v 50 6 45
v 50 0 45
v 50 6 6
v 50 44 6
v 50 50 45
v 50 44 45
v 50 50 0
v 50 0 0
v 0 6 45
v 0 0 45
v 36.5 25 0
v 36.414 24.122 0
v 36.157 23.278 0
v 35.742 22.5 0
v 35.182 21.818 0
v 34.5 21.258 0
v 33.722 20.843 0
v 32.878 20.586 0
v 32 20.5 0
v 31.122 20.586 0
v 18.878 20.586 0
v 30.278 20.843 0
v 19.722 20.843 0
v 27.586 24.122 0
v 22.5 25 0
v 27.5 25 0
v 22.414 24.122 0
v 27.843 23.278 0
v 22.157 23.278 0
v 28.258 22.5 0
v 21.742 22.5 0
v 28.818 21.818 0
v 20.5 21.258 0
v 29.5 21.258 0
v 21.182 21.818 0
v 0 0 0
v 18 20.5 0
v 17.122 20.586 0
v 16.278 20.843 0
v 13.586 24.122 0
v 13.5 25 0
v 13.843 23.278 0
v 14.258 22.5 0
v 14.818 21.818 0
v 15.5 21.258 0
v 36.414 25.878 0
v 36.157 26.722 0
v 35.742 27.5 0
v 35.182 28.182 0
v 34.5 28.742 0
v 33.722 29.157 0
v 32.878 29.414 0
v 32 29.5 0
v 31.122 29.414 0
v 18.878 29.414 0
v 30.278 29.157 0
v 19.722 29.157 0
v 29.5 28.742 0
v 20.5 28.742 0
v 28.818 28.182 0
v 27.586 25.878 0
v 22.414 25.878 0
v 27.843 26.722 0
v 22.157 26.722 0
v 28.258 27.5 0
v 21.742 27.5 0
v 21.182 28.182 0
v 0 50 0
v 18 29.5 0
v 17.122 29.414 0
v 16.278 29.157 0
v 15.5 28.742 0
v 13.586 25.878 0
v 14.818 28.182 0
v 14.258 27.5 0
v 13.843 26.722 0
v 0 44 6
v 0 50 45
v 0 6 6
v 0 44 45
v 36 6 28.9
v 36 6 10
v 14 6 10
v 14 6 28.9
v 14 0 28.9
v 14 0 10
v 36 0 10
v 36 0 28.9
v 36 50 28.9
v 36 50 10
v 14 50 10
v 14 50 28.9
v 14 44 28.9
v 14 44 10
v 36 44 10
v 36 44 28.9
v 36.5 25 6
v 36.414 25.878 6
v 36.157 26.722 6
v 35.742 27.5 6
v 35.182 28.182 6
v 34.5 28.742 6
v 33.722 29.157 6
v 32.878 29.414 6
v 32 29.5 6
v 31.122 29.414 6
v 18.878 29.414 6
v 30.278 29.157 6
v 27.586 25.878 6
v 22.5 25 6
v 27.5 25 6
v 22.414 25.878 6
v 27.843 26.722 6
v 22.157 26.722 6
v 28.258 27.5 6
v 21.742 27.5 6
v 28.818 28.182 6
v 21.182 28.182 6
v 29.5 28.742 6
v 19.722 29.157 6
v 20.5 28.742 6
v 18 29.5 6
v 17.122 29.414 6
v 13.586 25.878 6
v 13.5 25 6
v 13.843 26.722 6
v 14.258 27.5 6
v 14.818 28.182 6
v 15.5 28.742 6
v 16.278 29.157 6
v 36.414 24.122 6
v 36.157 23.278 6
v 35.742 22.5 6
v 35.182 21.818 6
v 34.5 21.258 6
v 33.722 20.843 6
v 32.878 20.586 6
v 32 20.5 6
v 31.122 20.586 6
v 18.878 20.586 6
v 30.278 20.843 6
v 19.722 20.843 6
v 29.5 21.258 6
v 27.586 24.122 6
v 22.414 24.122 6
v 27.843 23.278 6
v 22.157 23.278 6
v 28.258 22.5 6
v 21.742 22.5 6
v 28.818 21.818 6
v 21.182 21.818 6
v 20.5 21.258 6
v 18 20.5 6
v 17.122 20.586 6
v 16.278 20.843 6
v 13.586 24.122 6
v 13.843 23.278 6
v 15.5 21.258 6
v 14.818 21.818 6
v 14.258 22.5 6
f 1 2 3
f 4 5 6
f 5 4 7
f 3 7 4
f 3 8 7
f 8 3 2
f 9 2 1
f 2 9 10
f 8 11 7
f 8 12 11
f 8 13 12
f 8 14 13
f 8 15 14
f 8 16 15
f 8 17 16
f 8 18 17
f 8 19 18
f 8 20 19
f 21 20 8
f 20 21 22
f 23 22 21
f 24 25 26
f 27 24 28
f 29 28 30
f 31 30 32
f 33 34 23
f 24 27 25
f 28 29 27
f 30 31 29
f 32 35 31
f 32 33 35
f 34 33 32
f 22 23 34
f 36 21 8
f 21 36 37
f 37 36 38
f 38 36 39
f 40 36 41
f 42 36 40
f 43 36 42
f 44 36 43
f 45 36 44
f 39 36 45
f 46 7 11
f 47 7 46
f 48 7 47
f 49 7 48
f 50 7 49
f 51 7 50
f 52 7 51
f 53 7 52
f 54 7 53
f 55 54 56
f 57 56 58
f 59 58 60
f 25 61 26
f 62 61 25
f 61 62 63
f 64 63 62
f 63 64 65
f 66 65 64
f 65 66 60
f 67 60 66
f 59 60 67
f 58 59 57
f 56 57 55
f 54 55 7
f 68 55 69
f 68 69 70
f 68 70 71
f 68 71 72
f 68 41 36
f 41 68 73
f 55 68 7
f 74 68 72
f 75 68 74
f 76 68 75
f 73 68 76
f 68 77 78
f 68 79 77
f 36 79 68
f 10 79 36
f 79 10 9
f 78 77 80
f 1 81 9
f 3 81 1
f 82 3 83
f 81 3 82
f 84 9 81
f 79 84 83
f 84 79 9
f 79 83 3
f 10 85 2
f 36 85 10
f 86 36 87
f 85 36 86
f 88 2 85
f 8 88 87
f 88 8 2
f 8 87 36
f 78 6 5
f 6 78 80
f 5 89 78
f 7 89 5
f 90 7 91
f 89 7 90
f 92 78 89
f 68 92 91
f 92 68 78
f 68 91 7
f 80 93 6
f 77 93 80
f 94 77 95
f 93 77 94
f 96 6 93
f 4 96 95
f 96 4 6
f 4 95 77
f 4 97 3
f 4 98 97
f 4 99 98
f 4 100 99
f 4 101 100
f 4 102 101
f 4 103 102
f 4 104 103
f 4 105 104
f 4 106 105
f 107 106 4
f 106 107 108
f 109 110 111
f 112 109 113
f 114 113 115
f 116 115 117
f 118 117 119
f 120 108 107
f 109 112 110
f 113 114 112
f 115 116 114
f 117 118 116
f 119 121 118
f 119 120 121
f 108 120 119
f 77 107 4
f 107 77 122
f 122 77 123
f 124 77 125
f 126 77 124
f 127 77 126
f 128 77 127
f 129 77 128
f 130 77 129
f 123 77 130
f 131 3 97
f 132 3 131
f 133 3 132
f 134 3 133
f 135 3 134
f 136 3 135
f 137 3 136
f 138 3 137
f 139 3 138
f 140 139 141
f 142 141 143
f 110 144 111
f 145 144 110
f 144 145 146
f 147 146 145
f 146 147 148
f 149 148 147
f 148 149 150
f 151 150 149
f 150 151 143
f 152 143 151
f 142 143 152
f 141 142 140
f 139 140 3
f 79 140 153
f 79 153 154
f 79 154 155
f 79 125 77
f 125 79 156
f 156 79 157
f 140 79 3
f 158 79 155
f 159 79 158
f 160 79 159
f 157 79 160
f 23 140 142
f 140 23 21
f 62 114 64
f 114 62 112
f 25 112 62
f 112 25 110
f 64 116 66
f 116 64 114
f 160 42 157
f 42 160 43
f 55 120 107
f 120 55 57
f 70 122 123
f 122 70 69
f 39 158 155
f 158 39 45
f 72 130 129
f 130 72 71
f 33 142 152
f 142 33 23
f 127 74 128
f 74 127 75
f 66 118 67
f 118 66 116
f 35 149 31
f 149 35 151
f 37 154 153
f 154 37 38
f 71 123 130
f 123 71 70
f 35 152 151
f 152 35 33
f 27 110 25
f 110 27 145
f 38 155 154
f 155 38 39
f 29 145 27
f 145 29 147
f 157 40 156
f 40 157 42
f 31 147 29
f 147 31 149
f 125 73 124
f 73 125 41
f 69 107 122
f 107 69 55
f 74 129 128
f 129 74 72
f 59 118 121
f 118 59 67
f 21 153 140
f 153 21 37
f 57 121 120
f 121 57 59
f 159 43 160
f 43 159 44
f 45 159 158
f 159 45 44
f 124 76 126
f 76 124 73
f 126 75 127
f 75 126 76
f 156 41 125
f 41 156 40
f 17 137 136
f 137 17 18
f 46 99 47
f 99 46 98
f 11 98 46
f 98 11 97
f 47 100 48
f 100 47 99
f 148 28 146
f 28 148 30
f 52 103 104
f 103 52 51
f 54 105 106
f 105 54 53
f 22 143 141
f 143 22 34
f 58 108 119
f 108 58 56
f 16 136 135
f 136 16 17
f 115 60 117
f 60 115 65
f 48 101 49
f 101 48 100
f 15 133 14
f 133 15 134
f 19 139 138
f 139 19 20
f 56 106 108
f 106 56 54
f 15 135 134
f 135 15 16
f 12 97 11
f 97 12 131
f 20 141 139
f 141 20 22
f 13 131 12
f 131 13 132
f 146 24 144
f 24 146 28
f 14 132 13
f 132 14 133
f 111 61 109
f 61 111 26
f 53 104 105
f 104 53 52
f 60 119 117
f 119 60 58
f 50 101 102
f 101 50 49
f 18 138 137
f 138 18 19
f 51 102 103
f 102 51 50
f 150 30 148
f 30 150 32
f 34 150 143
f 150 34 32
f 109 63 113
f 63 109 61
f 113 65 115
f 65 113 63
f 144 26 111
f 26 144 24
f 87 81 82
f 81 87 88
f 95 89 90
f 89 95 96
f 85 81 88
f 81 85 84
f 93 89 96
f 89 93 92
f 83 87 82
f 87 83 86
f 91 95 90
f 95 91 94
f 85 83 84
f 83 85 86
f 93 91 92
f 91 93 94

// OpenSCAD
$fn = 32;

// ----------------------------------------------------------------------
// U-bracket: 50 x 50 x 45 mm
// ----------------------------------------------------------------------

// --- parameters (mm) ---
rail_len = 50;            // outer length, X
jaw_w = 50;               // outer width, Y
jaw_h = 45;               // upright height, Z
web_t = 6;                // wall thickness
hole_d = 9;               // clearance for M8
window_l = 22;            // window length
window_h = 18.9;          // window height

module hole_z(px, py) {
  translate([px, py, -2.5]) cylinder(h = web_t + 5, d = hole_d);
}
module hole_y_pz(pz) {
  /* through both uprights along Y */
  translate([0, -2.5, pz]) rotate([-90, 0, 0]) cylinder(h = jaw_w + 5, d = hole_d);
}

module base() {
  cube([rail_len, jaw_w, web_t]);
}

module uprights() {
  cube([rail_len, web_t, jaw_h]);
  translate([0, jaw_w - web_t, 0]) cube([rail_len, web_t, jaw_h]);
}

difference() {
  union() {
    base();
    uprights();
  }
  hole_z(18, 25);
  hole_z(32, 25);
  /* lightening window through both uprights */
  translate([rail_len / 2 - window_l / 2, -1, web_t + 4])
    cube([window_l, jaw_w + 2, window_h]);
}
